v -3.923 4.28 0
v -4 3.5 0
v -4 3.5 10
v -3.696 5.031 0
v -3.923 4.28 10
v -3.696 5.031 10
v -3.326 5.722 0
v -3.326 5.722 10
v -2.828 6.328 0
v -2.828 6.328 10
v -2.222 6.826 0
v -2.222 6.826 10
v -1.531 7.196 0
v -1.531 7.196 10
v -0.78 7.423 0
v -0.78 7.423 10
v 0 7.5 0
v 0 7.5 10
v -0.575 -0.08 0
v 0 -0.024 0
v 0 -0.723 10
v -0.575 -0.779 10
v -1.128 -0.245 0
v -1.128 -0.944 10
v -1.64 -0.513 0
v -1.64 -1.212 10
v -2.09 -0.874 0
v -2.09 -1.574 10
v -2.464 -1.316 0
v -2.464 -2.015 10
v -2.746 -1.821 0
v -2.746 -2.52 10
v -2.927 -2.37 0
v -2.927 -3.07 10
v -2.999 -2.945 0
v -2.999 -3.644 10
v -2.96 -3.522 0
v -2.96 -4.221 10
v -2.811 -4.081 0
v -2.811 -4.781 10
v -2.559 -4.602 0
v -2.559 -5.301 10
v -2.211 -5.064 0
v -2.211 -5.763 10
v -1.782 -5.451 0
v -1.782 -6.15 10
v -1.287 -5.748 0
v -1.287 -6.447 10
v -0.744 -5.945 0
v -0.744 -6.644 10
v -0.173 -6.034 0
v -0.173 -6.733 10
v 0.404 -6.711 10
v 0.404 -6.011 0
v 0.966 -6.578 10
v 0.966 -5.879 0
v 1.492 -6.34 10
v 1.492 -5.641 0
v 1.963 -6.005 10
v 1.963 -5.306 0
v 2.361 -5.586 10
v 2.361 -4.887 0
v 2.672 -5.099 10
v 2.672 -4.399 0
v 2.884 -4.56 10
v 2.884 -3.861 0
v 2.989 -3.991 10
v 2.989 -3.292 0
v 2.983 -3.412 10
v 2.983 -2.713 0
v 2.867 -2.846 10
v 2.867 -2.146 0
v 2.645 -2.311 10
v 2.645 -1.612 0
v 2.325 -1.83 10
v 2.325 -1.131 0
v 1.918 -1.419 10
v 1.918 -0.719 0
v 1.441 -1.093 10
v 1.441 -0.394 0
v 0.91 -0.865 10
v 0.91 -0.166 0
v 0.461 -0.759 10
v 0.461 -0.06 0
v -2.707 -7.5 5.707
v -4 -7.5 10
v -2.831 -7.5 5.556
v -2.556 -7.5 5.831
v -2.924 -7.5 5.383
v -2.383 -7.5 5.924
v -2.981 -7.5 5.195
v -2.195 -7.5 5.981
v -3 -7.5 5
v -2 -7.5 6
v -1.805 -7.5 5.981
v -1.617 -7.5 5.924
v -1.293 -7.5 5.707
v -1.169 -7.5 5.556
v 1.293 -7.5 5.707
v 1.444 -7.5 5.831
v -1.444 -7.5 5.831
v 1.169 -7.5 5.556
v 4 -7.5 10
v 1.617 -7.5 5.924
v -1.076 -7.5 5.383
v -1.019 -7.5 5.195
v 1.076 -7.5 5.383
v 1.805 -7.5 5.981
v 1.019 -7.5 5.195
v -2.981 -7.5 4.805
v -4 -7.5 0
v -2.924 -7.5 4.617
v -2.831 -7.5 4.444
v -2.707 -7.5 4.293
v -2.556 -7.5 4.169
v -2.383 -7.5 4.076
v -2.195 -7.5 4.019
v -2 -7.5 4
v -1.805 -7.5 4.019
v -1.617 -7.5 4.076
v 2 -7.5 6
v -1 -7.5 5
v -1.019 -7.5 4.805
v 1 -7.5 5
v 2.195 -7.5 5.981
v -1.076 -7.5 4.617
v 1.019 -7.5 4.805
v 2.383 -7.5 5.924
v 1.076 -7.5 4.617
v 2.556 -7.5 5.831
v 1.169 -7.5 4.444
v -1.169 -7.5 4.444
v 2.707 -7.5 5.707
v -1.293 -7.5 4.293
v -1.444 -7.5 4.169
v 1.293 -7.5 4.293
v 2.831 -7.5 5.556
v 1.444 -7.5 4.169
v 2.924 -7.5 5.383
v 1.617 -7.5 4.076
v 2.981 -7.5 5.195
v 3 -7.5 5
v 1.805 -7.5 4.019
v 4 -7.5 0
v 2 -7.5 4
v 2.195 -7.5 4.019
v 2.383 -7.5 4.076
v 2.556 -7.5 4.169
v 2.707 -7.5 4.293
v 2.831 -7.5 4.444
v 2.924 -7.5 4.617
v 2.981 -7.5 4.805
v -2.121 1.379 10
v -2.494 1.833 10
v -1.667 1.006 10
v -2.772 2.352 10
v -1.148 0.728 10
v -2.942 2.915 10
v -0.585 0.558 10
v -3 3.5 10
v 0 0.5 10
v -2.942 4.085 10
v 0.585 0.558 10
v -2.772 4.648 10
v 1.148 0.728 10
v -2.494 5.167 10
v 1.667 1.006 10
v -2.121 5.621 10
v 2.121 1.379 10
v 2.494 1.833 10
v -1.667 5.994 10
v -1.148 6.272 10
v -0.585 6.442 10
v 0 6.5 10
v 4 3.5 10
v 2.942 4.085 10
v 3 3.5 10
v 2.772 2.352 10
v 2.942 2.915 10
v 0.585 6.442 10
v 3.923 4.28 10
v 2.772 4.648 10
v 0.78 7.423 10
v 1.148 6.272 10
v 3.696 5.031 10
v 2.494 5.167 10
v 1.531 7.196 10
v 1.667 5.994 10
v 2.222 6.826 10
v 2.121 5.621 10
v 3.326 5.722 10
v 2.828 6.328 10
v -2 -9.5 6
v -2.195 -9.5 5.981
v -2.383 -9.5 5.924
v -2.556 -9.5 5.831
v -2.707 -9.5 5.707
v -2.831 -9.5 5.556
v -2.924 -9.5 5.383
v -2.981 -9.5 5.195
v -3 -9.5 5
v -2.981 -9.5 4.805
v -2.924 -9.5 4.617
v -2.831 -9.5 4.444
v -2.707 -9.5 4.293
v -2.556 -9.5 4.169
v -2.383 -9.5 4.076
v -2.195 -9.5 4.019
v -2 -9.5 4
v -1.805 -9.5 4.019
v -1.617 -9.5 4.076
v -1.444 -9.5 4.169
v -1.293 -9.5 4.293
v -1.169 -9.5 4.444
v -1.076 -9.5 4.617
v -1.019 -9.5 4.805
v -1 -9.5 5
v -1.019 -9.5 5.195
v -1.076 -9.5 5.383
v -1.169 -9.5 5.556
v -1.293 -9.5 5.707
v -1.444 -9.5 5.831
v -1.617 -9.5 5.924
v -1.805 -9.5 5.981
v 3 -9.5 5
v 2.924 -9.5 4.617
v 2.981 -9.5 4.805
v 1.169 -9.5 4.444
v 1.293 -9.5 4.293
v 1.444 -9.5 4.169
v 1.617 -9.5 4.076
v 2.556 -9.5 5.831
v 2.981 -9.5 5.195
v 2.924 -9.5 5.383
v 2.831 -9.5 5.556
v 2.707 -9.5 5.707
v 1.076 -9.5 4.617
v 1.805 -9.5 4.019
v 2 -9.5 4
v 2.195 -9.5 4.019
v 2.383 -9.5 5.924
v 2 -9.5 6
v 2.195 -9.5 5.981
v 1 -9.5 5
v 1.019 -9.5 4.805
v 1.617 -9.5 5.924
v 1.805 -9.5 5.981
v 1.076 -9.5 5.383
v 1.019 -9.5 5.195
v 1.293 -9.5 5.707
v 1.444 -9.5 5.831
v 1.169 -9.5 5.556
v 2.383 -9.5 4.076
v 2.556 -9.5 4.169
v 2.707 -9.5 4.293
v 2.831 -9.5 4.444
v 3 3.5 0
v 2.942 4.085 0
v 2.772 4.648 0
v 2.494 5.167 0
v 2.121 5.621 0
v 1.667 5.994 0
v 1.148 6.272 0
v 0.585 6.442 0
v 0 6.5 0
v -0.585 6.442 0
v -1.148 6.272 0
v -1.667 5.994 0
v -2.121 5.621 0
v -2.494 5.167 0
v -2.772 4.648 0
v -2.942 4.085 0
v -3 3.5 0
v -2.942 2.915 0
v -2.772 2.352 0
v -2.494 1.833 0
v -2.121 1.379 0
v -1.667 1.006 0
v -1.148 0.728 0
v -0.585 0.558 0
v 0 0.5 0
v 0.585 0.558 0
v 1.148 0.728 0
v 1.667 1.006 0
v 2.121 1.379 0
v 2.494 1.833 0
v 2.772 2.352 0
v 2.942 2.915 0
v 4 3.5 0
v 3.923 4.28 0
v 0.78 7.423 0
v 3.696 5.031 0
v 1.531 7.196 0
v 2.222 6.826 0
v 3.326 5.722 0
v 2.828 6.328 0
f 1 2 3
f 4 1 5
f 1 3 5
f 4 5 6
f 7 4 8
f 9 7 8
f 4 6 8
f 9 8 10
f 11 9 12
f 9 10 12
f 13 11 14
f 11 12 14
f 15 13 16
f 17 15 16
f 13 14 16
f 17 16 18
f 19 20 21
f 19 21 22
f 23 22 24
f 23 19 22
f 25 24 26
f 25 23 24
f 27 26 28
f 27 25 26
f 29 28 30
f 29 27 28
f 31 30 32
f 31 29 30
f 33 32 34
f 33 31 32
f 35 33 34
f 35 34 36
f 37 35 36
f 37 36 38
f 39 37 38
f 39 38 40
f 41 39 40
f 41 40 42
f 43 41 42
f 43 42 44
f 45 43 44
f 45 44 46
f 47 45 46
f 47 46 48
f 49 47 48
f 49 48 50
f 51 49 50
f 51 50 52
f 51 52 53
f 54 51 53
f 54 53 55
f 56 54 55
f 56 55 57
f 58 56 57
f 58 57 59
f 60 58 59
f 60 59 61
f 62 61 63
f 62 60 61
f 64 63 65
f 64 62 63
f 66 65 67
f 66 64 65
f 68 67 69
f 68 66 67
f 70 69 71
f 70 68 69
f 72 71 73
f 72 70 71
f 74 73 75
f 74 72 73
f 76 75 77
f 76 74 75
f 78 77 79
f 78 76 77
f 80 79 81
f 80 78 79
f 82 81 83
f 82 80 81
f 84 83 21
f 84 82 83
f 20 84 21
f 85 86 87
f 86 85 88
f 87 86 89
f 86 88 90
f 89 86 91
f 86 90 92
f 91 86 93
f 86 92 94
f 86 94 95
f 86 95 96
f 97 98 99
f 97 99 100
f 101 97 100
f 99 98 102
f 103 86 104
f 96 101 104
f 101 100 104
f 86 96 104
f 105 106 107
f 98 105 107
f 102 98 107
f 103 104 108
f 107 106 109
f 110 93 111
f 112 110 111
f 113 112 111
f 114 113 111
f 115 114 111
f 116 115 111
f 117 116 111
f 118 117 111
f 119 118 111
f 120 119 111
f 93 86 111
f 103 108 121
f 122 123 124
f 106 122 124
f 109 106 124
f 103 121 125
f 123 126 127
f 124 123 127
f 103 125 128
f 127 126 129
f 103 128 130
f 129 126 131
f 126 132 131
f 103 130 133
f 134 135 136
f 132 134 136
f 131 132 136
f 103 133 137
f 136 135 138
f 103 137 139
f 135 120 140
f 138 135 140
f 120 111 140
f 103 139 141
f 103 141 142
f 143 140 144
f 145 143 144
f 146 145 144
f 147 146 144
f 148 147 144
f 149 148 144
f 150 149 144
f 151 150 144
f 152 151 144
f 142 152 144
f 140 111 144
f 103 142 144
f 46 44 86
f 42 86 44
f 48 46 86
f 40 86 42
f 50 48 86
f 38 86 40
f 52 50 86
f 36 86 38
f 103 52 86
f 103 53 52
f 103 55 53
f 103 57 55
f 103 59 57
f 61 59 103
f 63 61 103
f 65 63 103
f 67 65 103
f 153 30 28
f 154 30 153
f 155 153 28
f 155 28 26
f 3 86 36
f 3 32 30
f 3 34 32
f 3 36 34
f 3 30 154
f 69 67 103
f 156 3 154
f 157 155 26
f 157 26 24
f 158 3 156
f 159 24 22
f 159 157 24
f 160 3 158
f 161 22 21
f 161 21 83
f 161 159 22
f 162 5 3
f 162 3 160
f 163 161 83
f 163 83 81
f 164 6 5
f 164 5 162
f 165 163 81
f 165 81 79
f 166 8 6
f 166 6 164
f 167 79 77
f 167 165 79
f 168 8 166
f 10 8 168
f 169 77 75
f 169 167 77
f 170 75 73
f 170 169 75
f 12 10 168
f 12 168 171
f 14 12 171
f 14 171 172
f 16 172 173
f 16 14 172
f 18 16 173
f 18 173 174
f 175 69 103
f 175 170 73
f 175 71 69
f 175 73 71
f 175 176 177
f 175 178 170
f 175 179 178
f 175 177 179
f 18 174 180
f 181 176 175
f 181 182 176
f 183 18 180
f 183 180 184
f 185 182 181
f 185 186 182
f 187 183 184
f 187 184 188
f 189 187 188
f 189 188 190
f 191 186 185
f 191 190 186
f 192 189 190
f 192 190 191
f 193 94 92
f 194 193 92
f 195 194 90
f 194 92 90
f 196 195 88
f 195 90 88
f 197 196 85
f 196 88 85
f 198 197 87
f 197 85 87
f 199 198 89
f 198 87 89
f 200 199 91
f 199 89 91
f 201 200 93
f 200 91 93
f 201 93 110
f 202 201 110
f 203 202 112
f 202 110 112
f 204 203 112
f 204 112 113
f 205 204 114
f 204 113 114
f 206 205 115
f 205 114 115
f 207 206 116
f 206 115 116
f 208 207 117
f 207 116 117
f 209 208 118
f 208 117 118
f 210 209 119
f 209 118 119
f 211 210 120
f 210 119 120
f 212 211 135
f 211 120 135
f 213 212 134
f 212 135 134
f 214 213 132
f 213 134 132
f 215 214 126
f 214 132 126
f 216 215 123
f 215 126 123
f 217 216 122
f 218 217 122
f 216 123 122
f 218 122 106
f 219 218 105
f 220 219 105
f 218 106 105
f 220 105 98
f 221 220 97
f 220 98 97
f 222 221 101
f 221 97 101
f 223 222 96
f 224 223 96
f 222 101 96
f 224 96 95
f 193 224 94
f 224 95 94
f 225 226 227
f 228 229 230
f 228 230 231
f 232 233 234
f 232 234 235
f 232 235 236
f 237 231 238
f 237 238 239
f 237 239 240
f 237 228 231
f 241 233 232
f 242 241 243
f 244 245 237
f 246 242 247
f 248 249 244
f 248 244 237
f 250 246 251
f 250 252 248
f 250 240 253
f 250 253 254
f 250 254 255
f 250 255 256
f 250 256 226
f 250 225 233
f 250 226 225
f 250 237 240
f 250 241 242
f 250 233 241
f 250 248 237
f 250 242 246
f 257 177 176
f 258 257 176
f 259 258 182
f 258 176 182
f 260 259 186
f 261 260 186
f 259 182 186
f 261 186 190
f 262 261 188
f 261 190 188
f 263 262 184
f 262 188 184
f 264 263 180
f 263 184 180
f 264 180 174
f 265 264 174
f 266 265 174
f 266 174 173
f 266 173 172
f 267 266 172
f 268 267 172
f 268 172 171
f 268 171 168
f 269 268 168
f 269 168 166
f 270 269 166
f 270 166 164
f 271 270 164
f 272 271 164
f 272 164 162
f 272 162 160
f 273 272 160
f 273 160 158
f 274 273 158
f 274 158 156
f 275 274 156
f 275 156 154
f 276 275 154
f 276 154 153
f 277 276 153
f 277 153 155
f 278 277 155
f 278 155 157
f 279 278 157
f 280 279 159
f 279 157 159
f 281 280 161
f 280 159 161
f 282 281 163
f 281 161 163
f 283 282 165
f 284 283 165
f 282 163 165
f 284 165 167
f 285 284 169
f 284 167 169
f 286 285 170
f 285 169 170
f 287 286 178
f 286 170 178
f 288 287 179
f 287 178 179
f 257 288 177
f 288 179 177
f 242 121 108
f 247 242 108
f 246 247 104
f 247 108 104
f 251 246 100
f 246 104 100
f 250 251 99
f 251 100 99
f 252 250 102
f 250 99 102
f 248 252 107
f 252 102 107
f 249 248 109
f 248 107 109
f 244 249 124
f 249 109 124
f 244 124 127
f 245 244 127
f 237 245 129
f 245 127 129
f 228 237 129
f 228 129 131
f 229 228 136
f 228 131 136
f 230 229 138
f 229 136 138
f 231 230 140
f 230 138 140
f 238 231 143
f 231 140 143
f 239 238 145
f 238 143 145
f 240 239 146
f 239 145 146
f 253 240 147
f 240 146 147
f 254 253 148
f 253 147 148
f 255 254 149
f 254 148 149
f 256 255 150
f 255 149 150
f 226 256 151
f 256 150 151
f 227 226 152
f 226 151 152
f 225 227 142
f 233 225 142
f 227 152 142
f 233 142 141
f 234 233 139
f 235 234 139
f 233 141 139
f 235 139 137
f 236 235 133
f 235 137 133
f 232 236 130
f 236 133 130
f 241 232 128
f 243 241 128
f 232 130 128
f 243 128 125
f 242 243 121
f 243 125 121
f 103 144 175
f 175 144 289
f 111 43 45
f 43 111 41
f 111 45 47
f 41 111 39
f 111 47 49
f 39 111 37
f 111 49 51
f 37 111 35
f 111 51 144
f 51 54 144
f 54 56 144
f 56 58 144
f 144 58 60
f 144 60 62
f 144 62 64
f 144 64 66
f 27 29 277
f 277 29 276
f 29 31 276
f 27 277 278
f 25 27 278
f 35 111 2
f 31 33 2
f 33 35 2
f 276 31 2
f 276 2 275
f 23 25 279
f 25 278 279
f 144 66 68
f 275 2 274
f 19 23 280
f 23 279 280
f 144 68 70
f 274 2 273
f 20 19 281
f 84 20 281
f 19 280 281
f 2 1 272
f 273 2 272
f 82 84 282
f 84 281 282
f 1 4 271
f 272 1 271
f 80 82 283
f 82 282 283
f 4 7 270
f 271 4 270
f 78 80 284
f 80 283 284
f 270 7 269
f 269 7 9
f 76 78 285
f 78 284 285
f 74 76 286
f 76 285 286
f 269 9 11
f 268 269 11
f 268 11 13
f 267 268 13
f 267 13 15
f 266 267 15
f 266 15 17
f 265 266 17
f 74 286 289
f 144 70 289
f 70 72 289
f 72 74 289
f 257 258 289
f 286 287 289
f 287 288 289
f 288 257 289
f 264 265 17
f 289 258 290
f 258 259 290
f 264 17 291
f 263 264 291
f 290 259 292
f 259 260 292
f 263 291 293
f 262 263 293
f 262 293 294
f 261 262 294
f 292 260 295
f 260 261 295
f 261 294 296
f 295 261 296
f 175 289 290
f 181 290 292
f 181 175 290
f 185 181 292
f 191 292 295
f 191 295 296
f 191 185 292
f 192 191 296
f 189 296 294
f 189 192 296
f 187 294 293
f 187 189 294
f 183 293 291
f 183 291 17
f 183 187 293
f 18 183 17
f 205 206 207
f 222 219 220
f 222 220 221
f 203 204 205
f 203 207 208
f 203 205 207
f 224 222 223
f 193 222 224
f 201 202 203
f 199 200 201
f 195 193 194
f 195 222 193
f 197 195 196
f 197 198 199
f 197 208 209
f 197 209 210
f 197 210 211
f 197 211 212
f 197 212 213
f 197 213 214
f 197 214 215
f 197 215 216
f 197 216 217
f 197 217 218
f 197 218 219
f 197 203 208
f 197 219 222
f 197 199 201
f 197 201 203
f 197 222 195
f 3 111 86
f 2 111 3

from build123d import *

# Parameters (mm, degrees)
SZKIC1_W                    = 8
SZKIC1_H                    = 15
DODANIE_WYCI_GNI_CIE1_DEPTH = 10
ZAOKR_GLENIE1_R             = 4
SZKIC2_R                    = 1
DODANIE_WYCI_GNI_CIE2_DEPTH = 2
SZKIC4_R                    = 3
WYTNIJ_WYCI_GNI_CIE1_DEPTH  = 15
SZKIC9_R                    = 3
WYTNIJ_WYCI_GNI_CIE2_DEPTH  = 25


with BuildPart() as part:
    # Szkic1 → Dodanie-wyciągnięcie1 (new body)
    with BuildSketch(Plane.XY):
        Rectangle(SZKIC1_W, SZKIC1_H)
    extrude(amount=DODANIE_WYCI_GNI_CIE1_DEPTH)

    # Zaokrąglenie1
    zaokr_glenie1_edges = [part.edges().sort_by_distance(p)[0] for p in [
        (4, 7.5, 5),
        (-4, 7.5, 5),
    ]]
    fillet(zaokr_glenie1_edges, radius=ZAOKR_GLENIE1_R - 0.0001)  # a hair under: the kernel refuses the full size

    # Szkic2 → Dodanie-wyciągnięcie2 (add)
    with BuildSketch(Plane.XZ.offset(7.5)):
        with Locations(Location((-2, 5, 0), (0, 0, 90))):
            Circle(SZKIC2_R)
        with Locations(Location((2, 5, 0), (0, 0, 90))):
            Circle(SZKIC2_R)
    extrude(amount=DODANIE_WYCI_GNI_CIE2_DEPTH)

    # Szkic4 → Wytnij-wyciągnięcie1 (cut)
    with BuildSketch(Plane.XY.offset(10)):
        with Locations((0, 3.5)):
            Circle(SZKIC4_R)
    extrude(amount=-WYTNIJ_WYCI_GNI_CIE1_DEPTH, mode=Mode.SUBTRACT)

    # Szkic9 → Wytnij-wyciągnięcie2 (cut)
    with BuildSketch(Plane(origin=(0, -2.657422367, -5.349421519), x_dir=(1, 0, 0), z_dir=(0, -0.06975647374412577, 0.9975640502598243))):
        with Locations(Location((0, 0, 0), (0, 0, 90))):
            Circle(SZKIC9_R)
    extrude(amount=WYTNIJ_WYCI_GNI_CIE2_DEPTH, mode=Mode.SUBTRACT)


solid = part.part
